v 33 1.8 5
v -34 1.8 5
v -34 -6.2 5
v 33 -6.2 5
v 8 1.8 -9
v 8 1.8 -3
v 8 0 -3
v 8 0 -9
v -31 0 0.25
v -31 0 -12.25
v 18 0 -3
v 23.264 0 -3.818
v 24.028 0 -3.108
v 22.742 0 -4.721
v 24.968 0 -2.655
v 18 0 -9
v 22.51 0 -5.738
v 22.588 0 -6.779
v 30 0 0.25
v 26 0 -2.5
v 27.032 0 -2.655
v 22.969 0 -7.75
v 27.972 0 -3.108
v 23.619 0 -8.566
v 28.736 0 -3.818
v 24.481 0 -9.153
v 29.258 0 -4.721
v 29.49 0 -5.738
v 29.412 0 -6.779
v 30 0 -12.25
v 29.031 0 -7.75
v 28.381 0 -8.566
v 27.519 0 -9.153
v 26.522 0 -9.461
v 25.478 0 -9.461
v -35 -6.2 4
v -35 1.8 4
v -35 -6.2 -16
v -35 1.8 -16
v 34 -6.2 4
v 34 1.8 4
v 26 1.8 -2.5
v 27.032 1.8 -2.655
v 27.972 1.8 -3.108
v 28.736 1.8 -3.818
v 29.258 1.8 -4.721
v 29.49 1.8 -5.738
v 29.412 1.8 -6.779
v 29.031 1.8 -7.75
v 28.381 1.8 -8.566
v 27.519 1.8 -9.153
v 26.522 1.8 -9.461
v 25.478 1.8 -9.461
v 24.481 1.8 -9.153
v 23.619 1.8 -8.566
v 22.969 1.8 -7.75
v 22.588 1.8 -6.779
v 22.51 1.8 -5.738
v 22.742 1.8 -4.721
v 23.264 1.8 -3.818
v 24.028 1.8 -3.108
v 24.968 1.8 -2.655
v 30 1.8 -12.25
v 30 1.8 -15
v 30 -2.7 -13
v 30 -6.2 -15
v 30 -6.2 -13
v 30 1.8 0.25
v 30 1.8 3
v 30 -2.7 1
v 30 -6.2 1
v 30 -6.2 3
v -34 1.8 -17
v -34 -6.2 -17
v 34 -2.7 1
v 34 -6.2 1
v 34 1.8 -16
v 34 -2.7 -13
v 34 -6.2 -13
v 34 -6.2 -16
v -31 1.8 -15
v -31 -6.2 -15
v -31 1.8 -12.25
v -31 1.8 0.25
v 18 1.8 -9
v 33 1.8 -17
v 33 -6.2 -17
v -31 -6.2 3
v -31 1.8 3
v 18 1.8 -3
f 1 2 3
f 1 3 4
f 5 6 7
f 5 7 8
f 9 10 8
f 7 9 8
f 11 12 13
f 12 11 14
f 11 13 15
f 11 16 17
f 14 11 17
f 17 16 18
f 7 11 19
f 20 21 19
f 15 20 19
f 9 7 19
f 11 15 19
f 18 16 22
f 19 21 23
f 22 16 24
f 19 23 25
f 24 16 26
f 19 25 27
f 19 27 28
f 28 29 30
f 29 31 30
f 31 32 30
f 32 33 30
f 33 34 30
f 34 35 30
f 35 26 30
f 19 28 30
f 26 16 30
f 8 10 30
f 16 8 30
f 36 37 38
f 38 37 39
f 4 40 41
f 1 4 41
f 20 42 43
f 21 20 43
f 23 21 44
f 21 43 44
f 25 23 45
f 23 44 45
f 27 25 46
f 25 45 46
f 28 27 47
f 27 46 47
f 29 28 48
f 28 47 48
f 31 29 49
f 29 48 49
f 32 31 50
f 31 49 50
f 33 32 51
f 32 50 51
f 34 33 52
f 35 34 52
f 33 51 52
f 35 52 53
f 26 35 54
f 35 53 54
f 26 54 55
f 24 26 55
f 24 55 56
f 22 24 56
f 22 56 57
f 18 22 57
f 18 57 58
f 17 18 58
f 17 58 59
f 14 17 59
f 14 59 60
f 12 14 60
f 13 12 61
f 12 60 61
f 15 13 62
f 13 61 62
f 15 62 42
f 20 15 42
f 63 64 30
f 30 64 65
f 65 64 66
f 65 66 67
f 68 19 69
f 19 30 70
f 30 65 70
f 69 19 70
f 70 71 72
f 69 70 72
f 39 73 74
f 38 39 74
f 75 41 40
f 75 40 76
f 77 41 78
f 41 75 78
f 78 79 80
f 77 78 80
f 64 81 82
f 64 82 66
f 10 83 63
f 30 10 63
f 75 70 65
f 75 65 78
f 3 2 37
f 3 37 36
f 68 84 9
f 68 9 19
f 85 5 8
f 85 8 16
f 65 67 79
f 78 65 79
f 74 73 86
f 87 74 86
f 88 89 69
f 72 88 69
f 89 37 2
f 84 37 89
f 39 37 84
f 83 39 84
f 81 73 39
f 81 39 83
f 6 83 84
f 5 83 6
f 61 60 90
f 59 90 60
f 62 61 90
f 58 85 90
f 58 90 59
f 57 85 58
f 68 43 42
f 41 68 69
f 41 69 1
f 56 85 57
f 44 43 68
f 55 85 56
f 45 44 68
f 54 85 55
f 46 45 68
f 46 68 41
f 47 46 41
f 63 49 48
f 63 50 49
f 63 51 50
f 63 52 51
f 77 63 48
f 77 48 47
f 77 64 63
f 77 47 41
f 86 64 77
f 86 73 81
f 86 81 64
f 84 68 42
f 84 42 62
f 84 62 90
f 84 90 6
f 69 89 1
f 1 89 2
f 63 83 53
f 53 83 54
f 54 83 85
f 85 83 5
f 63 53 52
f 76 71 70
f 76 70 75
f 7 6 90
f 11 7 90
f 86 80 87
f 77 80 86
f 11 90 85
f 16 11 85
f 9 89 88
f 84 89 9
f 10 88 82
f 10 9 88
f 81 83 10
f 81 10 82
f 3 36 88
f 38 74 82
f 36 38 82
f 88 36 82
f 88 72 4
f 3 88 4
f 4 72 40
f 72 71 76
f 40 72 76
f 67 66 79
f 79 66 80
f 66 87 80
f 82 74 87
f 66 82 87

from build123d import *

# Parameters (mm, degrees)
SKETCH1_W                       = 70
SKETCH1_H                       = 12
BOSS_EXTRUDE1_DEPTH             = 1.8
SKETCH2_W                       = 4
SKETCH2_H                       = 18
BOSS_EXTRUDE2_DEPTH             = 8
BOSS_EXTRUDE3_REACH             = 40.58
SKETCH3_W                       = 5
SKETCH3_H                       = 18
BOSS_EXTRUDE3_DIRECTION_2_REACH = 40.58
SKETCH4_W                       = 5
SKETCH4_H                       = 14
CUT_EXTRUDE1_DEPTH              = 3.5
SKETCH5_W                       = 61
SKETCH5_H                       = 12.5
BOSS_EXTRUDE4_DEPTH             = 1.8
SKETCH7_W                       = 70
SKETCH7_H                       = 2
BOSS_EXTRUDE5_DEPTH             = 8
SKETCH10_R                      = 3.5
CUT_EXTRUDE2_DEPTH              = 1.8
SKETCH11_W                      = 10
SKETCH11_H                      = 6
CUT_EXTRUDE3_DEPTH              = 1.8
CUT_EXTRUDE4_START              = -8
SKETCH12_W                      = 1
SKETCH12_H                      = 22
CUT_EXTRUDE4_DEPTH              = 8
CHAMFER1_SIZE                   = 1


with BuildPart() as part:
    # Sketch1 → Boss-Extrude1 (new body)
    with BuildSketch(Plane(origin=(0, 0, 0), x_dir=(1, 0, 0), z_dir=(0, 1, 0))):
        with Locations((0, 6)):
            Rectangle(SKETCH1_W, SKETCH1_H)
    extrude(amount=BOSS_EXTRUDE1_DEPTH)

    # Sketch2 → Boss-Extrude2 (add)
    with BuildSketch(Plane(origin=(0, 1.8, 0), x_dir=(1, 0, 0), z_dir=(0, 1, 0))):
        with Locations((-33, 6)):
            Rectangle(SKETCH2_W, SKETCH2_H)
    extrude(amount=-BOSS_EXTRUDE2_DEPTH)

    # Boss-Extrude3: up to this face of the body (flat: up to its plane)
    boss_extrude3_end = Plane(part.part.faces().sort_by_distance((-33, -6.2, -6))[0])
    # Sketch3 → Boss-Extrude3 (add, up to the picked face)
    with BuildSketch(Plane.XZ, mode=Mode.PRIVATE) as boss_extrude3_sk1:
        with Locations((32.5, -6)):
            Rectangle(SKETCH3_W, SKETCH3_H)
    boss_extrude3_tool1 = split(extrude(boss_extrude3_sk1.sketch, amount=BOSS_EXTRUDE3_REACH, mode=Mode.PRIVATE), bisect_by=boss_extrude3_end, keep=Keep.BOTH, mode=Mode.PRIVATE)
    add(boss_extrude3_tool1.solids().sort_by(Axis((32.5, 0, -6), (0, -1, 0)))[0])

    # Boss-Extrude3 direction 2: up to this face of the body (flat: up to its plane)
    boss_extrude3_direction_2_end = Plane(part.part.faces().sort_by_distance((-0.916666667, 1.8, -6))[0])
    # Sketch3 → Boss-Extrude3 direction 2 (add, up to the picked face)
    with BuildSketch(Plane.XZ, mode=Mode.PRIVATE) as boss_extrude3_direction_2_sk1:
        with Locations((32.5, -6)):
            Rectangle(SKETCH3_W, SKETCH3_H)
    boss_extrude3_direction_2_tool1 = split(extrude(boss_extrude3_direction_2_sk1.sketch, amount=-BOSS_EXTRUDE3_DIRECTION_2_REACH, mode=Mode.PRIVATE), bisect_by=boss_extrude3_direction_2_end, keep=Keep.BOTH, mode=Mode.PRIVATE)
    add(boss_extrude3_direction_2_tool1.solids().sort_by(Axis((32.5, 0, -6), (0, 1, 0)))[0])

    # Sketch4 → Cut-Extrude1 (cut)
    with BuildSketch(Plane.XZ.offset(6.2)):
        with Locations((32.5, -6)):
            Rectangle(SKETCH4_W, SKETCH4_H)
    extrude(amount=-CUT_EXTRUDE1_DEPTH, mode=Mode.SUBTRACT)

    # Sketch5 → Boss-Extrude4 (add)
    with BuildSketch(Plane(origin=(0, 1.8, 0), x_dir=(1, 0, 0), z_dir=(0, 1, 0))):
        with Locations((-0.5, 6)):
            Rectangle(SKETCH5_W, SKETCH5_H)
    extrude(amount=-BOSS_EXTRUDE4_DEPTH)

    # Sketch7 → Boss-Extrude5 (add)
    with BuildSketch(Plane(origin=(0, 1.8, 0), x_dir=(1, 0, 0), z_dir=(0, 1, 0))):
        with Locations((0, 16)):
            Rectangle(SKETCH7_W, SKETCH7_H)
        with Locations((0, -4)):
            Rectangle(SKETCH7_W, SKETCH7_H)
    extrude(amount=-BOSS_EXTRUDE5_DEPTH)

    # Sketch10 → Cut-Extrude2 (cut)
    with BuildSketch(Plane(origin=(0, 1.8, 0), x_dir=(1, 0, 0), z_dir=(0, 1, 0))):
        with Locations(Location((26, 6, 0), (0, 0, 270))):
            Circle(SKETCH10_R)
    extrude(amount=-CUT_EXTRUDE2_DEPTH, mode=Mode.SUBTRACT)

    # Sketch11 → Cut-Extrude3 (cut)
    with BuildSketch(Plane(origin=(0, 1.8, 0), x_dir=(1, 0, 0), z_dir=(0, 1, 0))):
        with Locations((13, 6)):
            Rectangle(SKETCH11_W, SKETCH11_H)
    extrude(amount=-CUT_EXTRUDE3_DEPTH, mode=Mode.SUBTRACT)

    # Sketch12 → Cut-Extrude4 (cut)
    with BuildSketch(Plane(origin=(0, 1.8, 0), x_dir=(1, 0, 0), z_dir=(0, 1, 0)).offset(CUT_EXTRUDE4_START)):
        with Locations((34.5, 6)):
            Rectangle(SKETCH12_W, SKETCH12_H)
    extrude(amount=CUT_EXTRUDE4_DEPTH, mode=Mode.SUBTRACT)

    # Chamfer1
    chamfer1_edges = [part.edges().sort_by_distance(p)[0] for p in [
        (-35, -2.2, -17),
        (-35, -2.2, 5),
        (34, -2.2, 5),
        (34, -2.2, -17),
    ]]
    chamfer(chamfer1_edges, length=CHAMFER1_SIZE)


solid = part.part
